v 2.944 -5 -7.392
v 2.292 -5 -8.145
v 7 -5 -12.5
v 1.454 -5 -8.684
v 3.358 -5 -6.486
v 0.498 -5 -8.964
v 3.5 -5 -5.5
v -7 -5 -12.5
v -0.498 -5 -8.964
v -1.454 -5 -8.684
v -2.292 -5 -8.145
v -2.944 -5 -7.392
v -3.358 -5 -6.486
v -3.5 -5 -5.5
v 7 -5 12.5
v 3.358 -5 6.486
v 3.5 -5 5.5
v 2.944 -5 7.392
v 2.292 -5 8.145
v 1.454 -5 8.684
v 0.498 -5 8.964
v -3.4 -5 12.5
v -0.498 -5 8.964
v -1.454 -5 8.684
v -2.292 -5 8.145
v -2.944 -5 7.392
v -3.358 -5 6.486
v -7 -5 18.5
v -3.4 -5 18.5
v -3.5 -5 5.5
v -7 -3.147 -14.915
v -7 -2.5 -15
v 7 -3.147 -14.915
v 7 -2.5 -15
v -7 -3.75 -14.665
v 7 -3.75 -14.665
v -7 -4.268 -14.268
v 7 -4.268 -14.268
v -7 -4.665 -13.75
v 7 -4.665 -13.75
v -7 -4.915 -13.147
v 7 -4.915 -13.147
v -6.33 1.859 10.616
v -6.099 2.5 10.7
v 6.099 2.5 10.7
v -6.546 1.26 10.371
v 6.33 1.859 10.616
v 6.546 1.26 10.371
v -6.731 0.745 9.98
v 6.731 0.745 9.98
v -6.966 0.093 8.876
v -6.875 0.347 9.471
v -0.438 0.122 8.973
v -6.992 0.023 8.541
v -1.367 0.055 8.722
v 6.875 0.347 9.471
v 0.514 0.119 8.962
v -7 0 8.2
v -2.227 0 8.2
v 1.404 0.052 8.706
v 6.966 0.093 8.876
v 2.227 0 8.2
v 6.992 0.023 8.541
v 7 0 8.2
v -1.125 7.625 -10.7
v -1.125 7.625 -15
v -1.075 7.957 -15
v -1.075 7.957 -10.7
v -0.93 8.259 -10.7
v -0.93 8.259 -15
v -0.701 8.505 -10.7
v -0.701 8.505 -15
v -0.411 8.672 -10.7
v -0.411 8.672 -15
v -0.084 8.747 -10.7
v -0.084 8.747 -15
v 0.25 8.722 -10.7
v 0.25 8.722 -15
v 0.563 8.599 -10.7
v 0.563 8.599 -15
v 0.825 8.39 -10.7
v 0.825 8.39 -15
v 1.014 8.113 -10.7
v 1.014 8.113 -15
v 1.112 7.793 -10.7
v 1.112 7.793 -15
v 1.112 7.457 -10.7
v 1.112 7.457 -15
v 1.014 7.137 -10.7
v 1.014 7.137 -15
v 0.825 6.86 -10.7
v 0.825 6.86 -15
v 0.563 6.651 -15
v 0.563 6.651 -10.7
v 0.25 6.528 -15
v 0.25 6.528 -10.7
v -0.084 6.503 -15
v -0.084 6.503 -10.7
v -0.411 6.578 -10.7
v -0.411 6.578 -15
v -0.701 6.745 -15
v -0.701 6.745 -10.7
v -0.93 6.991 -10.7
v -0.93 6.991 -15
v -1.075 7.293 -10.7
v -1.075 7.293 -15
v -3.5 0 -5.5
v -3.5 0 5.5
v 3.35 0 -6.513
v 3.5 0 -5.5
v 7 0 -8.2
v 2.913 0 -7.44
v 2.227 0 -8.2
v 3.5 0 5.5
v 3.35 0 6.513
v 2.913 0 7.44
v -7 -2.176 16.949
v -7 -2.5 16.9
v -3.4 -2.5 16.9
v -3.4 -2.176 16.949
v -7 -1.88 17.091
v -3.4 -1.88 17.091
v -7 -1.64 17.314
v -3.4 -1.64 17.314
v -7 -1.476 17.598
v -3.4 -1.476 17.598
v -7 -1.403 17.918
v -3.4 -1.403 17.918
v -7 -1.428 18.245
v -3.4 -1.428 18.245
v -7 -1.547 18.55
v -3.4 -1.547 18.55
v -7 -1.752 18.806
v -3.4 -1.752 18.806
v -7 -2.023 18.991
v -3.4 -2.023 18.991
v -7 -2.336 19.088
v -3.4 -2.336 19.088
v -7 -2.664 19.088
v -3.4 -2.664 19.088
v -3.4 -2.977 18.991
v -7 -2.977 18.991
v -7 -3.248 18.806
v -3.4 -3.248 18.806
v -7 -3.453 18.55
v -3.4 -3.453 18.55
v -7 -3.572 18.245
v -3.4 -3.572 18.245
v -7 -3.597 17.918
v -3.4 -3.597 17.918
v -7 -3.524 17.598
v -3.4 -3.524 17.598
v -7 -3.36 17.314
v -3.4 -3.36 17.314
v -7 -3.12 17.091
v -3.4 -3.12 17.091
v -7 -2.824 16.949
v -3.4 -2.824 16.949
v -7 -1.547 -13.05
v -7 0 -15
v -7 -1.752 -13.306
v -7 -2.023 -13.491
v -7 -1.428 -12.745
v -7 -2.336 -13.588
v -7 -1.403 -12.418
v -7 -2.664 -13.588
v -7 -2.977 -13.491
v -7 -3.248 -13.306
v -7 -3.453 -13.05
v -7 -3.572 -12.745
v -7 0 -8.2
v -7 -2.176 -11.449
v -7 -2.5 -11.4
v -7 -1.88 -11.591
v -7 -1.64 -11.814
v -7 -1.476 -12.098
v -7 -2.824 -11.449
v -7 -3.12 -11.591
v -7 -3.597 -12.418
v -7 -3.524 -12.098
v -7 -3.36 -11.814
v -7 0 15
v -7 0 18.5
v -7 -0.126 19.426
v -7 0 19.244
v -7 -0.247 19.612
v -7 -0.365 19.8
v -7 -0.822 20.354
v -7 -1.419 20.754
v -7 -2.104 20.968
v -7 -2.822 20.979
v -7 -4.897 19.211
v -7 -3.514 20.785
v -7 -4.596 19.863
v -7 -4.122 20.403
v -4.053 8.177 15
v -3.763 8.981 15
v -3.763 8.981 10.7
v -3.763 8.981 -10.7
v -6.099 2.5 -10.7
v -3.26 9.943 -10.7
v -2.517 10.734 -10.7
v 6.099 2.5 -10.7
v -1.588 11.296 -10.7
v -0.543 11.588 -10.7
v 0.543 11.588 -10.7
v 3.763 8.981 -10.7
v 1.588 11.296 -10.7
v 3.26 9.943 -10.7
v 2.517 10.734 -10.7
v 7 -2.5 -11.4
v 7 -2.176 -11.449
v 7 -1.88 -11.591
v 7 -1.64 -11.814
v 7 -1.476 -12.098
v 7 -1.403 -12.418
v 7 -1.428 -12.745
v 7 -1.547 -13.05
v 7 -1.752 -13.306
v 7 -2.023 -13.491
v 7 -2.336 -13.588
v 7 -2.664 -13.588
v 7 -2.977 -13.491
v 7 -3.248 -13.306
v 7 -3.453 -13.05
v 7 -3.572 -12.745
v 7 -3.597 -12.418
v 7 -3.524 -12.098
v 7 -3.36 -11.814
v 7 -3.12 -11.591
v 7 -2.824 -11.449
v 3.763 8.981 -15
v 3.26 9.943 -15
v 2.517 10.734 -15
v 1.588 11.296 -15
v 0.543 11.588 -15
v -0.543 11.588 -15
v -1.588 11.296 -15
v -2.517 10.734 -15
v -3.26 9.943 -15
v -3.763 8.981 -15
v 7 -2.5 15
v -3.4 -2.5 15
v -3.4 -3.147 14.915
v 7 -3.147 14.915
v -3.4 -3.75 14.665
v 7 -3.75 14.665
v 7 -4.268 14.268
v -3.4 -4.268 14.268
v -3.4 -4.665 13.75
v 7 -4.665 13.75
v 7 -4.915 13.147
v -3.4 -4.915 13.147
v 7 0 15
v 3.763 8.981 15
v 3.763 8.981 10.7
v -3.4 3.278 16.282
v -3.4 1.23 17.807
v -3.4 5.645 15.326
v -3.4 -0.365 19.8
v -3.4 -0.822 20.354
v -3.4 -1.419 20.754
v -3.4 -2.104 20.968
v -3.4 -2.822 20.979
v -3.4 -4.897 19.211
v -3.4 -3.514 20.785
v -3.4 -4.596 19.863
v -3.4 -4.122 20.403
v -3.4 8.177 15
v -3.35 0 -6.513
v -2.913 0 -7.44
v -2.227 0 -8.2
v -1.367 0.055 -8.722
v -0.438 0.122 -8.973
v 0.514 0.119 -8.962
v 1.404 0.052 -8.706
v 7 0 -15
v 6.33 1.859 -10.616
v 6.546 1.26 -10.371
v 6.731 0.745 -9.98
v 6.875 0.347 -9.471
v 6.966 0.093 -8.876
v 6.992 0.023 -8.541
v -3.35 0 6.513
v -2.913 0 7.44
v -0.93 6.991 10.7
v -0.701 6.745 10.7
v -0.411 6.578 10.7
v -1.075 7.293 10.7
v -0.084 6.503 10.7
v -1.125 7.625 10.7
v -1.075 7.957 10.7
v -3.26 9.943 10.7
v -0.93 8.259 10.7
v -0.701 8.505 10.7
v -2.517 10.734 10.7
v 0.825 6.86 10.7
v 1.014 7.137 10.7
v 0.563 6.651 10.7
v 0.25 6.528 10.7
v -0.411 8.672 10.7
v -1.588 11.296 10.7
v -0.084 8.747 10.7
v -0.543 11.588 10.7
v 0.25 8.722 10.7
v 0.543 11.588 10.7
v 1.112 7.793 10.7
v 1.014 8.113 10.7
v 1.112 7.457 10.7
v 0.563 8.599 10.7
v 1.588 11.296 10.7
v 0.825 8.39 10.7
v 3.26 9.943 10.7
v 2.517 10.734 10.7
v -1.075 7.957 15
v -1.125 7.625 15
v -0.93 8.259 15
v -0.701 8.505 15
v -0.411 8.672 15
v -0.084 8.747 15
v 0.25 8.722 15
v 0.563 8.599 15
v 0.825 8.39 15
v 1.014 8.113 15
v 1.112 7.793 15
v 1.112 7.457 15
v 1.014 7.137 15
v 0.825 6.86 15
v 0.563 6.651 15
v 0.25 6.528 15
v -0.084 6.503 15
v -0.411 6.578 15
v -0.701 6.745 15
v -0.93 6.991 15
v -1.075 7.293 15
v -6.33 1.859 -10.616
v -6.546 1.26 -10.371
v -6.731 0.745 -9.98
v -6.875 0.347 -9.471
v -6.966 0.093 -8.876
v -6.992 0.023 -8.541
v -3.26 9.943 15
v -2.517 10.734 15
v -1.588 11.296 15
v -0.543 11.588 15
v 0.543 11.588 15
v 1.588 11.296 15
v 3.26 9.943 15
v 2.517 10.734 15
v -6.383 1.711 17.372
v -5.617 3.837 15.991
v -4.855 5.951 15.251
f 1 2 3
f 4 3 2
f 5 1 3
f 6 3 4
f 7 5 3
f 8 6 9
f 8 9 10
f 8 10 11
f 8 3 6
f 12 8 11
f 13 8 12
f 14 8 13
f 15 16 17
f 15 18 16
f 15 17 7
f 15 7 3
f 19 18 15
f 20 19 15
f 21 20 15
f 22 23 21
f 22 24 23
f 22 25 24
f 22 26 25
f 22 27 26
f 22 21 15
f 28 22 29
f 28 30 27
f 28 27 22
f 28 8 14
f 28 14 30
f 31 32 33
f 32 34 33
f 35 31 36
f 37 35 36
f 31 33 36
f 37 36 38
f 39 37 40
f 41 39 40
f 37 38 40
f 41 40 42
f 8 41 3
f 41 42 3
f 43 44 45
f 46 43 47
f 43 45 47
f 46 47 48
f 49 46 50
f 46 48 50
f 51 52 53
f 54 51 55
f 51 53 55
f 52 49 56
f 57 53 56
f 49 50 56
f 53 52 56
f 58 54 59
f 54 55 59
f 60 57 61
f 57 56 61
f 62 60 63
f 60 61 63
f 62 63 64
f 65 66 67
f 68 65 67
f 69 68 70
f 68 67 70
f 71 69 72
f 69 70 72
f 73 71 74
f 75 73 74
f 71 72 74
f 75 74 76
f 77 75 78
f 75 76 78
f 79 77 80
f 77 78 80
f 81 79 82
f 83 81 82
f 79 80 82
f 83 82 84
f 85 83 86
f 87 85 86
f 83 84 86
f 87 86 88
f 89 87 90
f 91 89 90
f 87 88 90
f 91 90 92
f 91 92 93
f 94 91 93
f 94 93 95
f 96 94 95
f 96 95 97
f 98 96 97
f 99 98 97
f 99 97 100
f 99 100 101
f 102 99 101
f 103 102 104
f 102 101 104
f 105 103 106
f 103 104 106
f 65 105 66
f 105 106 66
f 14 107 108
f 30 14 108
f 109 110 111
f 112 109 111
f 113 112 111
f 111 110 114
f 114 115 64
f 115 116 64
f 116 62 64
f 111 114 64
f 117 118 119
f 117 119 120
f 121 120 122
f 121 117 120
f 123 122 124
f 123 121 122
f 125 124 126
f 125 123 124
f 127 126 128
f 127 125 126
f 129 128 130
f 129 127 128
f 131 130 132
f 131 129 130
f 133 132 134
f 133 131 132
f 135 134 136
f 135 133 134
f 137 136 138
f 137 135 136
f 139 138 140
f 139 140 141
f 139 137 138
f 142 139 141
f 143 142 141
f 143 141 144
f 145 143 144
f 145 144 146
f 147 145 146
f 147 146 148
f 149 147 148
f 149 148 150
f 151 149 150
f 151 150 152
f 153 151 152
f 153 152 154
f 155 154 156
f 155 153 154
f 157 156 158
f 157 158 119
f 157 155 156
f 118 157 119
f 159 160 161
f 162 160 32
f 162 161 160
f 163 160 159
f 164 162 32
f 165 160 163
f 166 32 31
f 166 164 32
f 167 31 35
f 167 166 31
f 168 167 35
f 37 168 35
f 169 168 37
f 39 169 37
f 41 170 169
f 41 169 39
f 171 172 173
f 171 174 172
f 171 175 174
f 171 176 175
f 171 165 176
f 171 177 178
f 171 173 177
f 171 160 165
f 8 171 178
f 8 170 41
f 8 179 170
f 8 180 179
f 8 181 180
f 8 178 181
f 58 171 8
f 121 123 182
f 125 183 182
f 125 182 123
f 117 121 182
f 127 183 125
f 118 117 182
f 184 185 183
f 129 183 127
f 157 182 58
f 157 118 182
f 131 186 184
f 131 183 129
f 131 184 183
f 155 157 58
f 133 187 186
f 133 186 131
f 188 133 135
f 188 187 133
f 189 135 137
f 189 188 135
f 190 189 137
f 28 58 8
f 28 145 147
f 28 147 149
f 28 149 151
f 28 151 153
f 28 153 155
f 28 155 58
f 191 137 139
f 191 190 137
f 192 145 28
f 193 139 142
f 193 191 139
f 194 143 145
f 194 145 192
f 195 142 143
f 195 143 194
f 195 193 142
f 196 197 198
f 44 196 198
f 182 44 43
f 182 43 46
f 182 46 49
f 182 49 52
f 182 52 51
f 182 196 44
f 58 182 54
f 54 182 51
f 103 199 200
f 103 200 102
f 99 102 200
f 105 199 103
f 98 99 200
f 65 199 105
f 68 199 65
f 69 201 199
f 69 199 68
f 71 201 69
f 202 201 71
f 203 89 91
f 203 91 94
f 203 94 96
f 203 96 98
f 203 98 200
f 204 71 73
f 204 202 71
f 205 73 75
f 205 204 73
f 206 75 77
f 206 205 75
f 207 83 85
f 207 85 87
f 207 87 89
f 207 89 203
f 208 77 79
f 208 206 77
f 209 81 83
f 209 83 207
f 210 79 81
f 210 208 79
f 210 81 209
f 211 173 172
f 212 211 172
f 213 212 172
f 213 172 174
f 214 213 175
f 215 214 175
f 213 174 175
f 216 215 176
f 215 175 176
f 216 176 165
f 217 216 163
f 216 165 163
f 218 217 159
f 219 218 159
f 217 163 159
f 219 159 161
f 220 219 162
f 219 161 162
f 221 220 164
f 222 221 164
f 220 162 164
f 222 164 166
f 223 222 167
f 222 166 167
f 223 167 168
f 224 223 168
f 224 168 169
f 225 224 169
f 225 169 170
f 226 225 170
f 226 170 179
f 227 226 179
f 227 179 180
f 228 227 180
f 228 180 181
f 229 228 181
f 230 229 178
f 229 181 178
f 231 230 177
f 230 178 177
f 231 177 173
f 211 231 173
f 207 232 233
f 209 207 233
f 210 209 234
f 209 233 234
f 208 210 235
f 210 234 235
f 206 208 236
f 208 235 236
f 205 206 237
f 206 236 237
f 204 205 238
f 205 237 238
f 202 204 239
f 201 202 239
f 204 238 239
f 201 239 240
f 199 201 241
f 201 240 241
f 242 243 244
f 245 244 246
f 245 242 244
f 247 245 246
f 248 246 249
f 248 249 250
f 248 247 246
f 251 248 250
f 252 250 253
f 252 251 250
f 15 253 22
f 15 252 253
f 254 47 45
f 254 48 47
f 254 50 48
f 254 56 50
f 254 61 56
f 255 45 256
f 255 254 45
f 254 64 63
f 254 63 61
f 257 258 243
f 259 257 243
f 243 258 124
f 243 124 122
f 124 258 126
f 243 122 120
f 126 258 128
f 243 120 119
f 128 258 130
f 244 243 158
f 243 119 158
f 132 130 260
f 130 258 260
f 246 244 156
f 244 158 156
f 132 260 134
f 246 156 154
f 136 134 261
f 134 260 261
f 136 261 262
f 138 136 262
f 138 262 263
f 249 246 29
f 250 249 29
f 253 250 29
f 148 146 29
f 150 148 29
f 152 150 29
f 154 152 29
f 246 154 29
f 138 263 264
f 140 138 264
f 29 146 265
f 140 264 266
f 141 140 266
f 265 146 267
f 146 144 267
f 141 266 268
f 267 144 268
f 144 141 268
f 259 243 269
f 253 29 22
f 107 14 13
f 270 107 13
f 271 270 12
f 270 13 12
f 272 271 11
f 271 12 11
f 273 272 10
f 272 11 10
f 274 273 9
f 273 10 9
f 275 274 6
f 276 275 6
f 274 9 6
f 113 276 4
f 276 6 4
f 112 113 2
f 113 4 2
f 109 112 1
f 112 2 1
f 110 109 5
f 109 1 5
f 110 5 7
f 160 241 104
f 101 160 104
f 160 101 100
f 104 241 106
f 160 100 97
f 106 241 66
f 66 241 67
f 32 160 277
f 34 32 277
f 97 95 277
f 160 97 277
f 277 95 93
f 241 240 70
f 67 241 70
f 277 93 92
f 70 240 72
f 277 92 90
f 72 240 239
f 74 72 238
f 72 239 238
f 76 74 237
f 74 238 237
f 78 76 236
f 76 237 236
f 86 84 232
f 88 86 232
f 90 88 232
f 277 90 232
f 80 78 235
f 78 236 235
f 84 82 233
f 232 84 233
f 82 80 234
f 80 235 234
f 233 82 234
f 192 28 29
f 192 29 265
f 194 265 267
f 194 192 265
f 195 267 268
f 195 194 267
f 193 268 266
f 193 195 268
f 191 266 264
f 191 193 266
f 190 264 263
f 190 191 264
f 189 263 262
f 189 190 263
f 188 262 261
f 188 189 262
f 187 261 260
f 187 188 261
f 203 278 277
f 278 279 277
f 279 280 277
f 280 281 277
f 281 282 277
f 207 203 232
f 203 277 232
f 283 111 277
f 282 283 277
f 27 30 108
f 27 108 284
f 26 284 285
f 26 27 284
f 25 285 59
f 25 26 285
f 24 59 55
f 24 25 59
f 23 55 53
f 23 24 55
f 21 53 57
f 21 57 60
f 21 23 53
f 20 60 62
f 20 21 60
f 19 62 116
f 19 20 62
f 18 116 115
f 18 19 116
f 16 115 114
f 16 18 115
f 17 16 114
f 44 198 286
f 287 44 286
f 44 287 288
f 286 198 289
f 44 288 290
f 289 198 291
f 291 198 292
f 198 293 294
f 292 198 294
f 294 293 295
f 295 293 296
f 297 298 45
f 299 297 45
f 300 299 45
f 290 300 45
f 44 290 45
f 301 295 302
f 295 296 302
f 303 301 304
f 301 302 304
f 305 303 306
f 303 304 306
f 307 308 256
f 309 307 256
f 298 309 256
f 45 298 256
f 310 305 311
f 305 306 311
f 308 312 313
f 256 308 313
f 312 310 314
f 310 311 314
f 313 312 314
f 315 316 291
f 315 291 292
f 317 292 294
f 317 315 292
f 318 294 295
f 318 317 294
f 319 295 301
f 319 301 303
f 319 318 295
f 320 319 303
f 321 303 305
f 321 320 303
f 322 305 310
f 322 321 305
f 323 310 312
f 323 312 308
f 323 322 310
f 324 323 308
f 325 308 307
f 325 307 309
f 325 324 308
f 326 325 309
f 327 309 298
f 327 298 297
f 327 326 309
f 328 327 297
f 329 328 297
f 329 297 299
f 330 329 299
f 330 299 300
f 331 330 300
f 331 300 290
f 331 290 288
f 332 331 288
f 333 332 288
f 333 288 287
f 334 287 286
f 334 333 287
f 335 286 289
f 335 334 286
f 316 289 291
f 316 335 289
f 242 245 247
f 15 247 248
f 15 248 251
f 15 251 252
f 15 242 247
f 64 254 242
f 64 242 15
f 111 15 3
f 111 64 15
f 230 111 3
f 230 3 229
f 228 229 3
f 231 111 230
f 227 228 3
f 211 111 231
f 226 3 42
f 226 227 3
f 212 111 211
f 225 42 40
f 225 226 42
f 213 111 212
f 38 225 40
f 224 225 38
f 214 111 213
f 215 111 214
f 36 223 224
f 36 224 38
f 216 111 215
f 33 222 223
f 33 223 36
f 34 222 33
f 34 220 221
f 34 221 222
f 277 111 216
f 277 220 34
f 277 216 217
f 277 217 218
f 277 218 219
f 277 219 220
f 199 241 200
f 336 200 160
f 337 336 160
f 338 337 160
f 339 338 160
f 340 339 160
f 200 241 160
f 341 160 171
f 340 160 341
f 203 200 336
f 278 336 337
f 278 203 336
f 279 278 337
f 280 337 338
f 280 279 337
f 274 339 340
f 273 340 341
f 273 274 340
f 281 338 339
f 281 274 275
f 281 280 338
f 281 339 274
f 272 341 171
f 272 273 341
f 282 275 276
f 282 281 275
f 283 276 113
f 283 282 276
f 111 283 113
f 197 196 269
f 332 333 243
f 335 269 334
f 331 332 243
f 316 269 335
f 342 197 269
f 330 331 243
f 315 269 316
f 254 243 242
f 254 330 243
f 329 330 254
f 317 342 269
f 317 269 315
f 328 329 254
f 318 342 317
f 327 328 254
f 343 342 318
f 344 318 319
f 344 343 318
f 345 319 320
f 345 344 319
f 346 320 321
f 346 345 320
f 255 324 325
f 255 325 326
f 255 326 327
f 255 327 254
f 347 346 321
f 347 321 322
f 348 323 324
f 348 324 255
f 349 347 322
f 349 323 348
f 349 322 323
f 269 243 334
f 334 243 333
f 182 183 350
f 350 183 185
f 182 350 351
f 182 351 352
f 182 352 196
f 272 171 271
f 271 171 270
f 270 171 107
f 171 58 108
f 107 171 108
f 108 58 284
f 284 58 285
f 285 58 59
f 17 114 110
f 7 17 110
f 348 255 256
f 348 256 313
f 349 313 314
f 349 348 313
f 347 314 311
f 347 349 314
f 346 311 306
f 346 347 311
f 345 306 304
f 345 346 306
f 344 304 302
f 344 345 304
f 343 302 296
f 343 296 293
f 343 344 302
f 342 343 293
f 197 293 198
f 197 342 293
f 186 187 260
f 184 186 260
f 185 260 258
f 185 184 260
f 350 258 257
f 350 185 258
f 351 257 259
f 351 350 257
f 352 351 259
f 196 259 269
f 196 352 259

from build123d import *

# Parameters (mm, degrees)
SKETCH1_W                      = 14
SKETCH1_H                      = 15
BOSS_EXTRUDE1_DEPTH            = 5
SKETCH3_R                      = 1.1
CUT_EXTRUDE1_DEPTH             = 14
BOSS_EXTRUDE2_DEPTH            = 4.3
SKETCH5_R                      = 1.125
CUT_EXTRUDE2_DEPTH             = 4.3
FILLET1_R                      = 2.5
CUT_EXTRUDE3_REACH             = 22.227
CUT_EXTRUDE3_DIRECTION_2_REACH = 22.227
BOSS_EXTRUDE4_START            = -14
SKETCH7_R                      = 1.1
BOSS_EXTRUDE4_DEPTH            = 3.6
BOSS_EXTRUDE5_START            = -10.4
SKETCH8_R                      = 1.1
BOSS_EXTRUDE5_DEPTH            = 10.4
FILLET2_R                      = 10


with BuildPart() as part:
    # Sketch1 → Boss-Extrude1 (new body)
    with BuildSketch(Plane(origin=(0, 0, 0), x_dir=(1, 0, 0), z_dir=(0, 1, 0))):
        with Locations((0, 7.5)):
            Rectangle(SKETCH1_W, SKETCH1_H)
    extrude(amount=-BOSS_EXTRUDE1_DEPTH)

    # Sketch3 → Cut-Extrude1 (cut)
    with BuildSketch(Plane.ZY.offset(7)):
        with Locations((-12.5, -2.5)):
            Circle(SKETCH3_R)
    extrude(amount=-CUT_EXTRUDE1_DEPTH, mode=Mode.SUBTRACT)

    # Sketch4 → Boss-Extrude2 (add)
    with BuildSketch(Plane(origin=(0, 0, -15), x_dir=(-1, 0, 0), z_dir=(0, 0, -1))):
        with BuildLine():
            Line((-7, 0), (-3.763056055, 8.981248181))
            ThreePointArc((-3.763056055, 8.981248181), (0, 11.625), (3.763056055, 8.981248181))
            Line((3.763056055, 8.981248181), (7, 0))
            Line((7, 0), (-7, 0))
        make_face()
    extrude(amount=-BOSS_EXTRUDE2_DEPTH)

    # Sketch5 → Cut-Extrude2 (cut)
    with BuildSketch(Plane(origin=(0, 0, -15), x_dir=(-1, 0, 0), z_dir=(0, 0, -1))):
        with Locations((0, 7.625)):
            Circle(SKETCH5_R)
    extrude(amount=-CUT_EXTRUDE2_DEPTH, mode=Mode.SUBTRACT)

    # Fillet1
    fillet1_edges = [part.edges().sort_by_distance(p)[0] for p in [
        (0, -5, -15),
        (0, 0, -10.7),
    ]]
    fillet(fillet1_edges, radius=FILLET1_R)

    # Sketch6 → Cut-Extrude3 (cut, up to next)
    with BuildSketch(Plane(origin=(0, 0, 0), x_dir=(1, 0, 0), z_dir=(0, 1, 0)), mode=Mode.PRIVATE) as cut_extrude3_sk1:
        with BuildLine():
            Line((-3.5, -5.5), (-3.5, 5.5))
            ThreePointArc((-3.5, 5.5), (0, 9), (3.5, 5.5))
            Line((3.5, 5.5), (3.5, -5.5))
            ThreePointArc((3.5, -5.5), (0, -9), (-3.5, -5.5))
        make_face()
    cut_extrude3_tool1 = extrude(cut_extrude3_sk1.sketch, amount=-CUT_EXTRUDE3_REACH, mode=Mode.PRIVATE) & part.part
    add(cut_extrude3_tool1.solids().sort_by_distance((0, 0, 0))[0], mode=Mode.SUBTRACT)

    # Sketch6 → Cut-Extrude3 direction 2 (cut, up to next)
    with BuildSketch(Plane(origin=(0, 0, 0), x_dir=(1, 0, 0), z_dir=(0, 1, 0)), mode=Mode.PRIVATE) as cut_extrude3_direction_2_sk1:
        with BuildLine():
            Line((-3.5, -5.5), (-3.5, 5.5))
            ThreePointArc((-3.5, 5.5), (0, 9), (3.5, 5.5))
            Line((3.5, 5.5), (3.5, -5.5))
            ThreePointArc((3.5, -5.5), (0, -9), (-3.5, -5.5))
        make_face()
    cut_extrude3_direction_2_tool1 = extrude(cut_extrude3_direction_2_sk1.sketch, amount=CUT_EXTRUDE3_DIRECTION_2_REACH, mode=Mode.PRIVATE) & part.part
    add(cut_extrude3_direction_2_tool1.solids().sort_by_distance((0, 0, 0))[0], mode=Mode.SUBTRACT)

    # Mirror1: part across plane


with BuildPart() as part_1:
    add(part.part)
    add(part.part.mirror(Plane.XY))

    # Sketch7 → Boss-Extrude4 (add)
    with BuildSketch(Plane(origin=(7, 0, 0), x_dir=(0, 0, -1), z_dir=(1, 0, 0)).offset(BOSS_EXTRUDE4_START)):
        with BuildLine():
            Line((-12.5, -5), (-18.5, -5))
            ThreePointArc((-18.5, -5), (-21, -2.5), (-18.5, 0))
            Line((-18.5, 0), (-12.5, 0))
            ThreePointArc((-12.5, 0), (-10, -2.5), (-12.5, -5))
        make_face()
        with Locations((-18, -2.5)):
            Circle(SKETCH7_R, mode=Mode.SUBTRACT)
    extrude(amount=BOSS_EXTRUDE4_DEPTH)

    # Sketch8 → Boss-Extrude5 (add)
    with BuildSketch(Plane(origin=(7, 0, 0), x_dir=(0, 0, -1), z_dir=(1, 0, 0)).offset(BOSS_EXTRUDE5_START)):
        with Locations((-12.5, -2.5)):
            Circle(SKETCH8_R)
    extrude(amount=BOSS_EXTRUDE5_DEPTH)

    # Fillet2
    # the kernel refuses this fillet: 10 mm, written as the material it adds along each edge
    with BuildSketch(Plane(origin=(-7, 0, 15), x_dir=(0, 1, 0), z_dir=(1, 0, 0))) as fillet2_piece_1_section:
        with BuildLine():
            CenterArc((8.177078252, 10), FILLET2_R, 211.332251498, 58.667748502)
            Line((-0.36458435, 4.8), (-1.21875061, 4.28))
            ThreePointArc((-1.21875061, 4.28), (-1, 3.5), (-1, 0))
            Line((-1, 0), (0, -1))
            Line((0, -1), (8.177078252, -1))
            Line((8.177078252, -1), (8.177078252, 0))
        make_face()
    fillet2_piece_1 = extrude(amount=3.6, mode=Mode.PRIVATE)
    fillet2_piece_1 = split(fillet2_piece_1, bisect_by=Plane(origin=(-6.281736491, 1.992899149, 16.030712871), z_dir=(0.9407640136683284, -0.33906204533485823, 0)), keep=Keep.TOP, mode=Mode.PRIVATE)
    add(fillet2_piece_1)


solid = part_1.part
